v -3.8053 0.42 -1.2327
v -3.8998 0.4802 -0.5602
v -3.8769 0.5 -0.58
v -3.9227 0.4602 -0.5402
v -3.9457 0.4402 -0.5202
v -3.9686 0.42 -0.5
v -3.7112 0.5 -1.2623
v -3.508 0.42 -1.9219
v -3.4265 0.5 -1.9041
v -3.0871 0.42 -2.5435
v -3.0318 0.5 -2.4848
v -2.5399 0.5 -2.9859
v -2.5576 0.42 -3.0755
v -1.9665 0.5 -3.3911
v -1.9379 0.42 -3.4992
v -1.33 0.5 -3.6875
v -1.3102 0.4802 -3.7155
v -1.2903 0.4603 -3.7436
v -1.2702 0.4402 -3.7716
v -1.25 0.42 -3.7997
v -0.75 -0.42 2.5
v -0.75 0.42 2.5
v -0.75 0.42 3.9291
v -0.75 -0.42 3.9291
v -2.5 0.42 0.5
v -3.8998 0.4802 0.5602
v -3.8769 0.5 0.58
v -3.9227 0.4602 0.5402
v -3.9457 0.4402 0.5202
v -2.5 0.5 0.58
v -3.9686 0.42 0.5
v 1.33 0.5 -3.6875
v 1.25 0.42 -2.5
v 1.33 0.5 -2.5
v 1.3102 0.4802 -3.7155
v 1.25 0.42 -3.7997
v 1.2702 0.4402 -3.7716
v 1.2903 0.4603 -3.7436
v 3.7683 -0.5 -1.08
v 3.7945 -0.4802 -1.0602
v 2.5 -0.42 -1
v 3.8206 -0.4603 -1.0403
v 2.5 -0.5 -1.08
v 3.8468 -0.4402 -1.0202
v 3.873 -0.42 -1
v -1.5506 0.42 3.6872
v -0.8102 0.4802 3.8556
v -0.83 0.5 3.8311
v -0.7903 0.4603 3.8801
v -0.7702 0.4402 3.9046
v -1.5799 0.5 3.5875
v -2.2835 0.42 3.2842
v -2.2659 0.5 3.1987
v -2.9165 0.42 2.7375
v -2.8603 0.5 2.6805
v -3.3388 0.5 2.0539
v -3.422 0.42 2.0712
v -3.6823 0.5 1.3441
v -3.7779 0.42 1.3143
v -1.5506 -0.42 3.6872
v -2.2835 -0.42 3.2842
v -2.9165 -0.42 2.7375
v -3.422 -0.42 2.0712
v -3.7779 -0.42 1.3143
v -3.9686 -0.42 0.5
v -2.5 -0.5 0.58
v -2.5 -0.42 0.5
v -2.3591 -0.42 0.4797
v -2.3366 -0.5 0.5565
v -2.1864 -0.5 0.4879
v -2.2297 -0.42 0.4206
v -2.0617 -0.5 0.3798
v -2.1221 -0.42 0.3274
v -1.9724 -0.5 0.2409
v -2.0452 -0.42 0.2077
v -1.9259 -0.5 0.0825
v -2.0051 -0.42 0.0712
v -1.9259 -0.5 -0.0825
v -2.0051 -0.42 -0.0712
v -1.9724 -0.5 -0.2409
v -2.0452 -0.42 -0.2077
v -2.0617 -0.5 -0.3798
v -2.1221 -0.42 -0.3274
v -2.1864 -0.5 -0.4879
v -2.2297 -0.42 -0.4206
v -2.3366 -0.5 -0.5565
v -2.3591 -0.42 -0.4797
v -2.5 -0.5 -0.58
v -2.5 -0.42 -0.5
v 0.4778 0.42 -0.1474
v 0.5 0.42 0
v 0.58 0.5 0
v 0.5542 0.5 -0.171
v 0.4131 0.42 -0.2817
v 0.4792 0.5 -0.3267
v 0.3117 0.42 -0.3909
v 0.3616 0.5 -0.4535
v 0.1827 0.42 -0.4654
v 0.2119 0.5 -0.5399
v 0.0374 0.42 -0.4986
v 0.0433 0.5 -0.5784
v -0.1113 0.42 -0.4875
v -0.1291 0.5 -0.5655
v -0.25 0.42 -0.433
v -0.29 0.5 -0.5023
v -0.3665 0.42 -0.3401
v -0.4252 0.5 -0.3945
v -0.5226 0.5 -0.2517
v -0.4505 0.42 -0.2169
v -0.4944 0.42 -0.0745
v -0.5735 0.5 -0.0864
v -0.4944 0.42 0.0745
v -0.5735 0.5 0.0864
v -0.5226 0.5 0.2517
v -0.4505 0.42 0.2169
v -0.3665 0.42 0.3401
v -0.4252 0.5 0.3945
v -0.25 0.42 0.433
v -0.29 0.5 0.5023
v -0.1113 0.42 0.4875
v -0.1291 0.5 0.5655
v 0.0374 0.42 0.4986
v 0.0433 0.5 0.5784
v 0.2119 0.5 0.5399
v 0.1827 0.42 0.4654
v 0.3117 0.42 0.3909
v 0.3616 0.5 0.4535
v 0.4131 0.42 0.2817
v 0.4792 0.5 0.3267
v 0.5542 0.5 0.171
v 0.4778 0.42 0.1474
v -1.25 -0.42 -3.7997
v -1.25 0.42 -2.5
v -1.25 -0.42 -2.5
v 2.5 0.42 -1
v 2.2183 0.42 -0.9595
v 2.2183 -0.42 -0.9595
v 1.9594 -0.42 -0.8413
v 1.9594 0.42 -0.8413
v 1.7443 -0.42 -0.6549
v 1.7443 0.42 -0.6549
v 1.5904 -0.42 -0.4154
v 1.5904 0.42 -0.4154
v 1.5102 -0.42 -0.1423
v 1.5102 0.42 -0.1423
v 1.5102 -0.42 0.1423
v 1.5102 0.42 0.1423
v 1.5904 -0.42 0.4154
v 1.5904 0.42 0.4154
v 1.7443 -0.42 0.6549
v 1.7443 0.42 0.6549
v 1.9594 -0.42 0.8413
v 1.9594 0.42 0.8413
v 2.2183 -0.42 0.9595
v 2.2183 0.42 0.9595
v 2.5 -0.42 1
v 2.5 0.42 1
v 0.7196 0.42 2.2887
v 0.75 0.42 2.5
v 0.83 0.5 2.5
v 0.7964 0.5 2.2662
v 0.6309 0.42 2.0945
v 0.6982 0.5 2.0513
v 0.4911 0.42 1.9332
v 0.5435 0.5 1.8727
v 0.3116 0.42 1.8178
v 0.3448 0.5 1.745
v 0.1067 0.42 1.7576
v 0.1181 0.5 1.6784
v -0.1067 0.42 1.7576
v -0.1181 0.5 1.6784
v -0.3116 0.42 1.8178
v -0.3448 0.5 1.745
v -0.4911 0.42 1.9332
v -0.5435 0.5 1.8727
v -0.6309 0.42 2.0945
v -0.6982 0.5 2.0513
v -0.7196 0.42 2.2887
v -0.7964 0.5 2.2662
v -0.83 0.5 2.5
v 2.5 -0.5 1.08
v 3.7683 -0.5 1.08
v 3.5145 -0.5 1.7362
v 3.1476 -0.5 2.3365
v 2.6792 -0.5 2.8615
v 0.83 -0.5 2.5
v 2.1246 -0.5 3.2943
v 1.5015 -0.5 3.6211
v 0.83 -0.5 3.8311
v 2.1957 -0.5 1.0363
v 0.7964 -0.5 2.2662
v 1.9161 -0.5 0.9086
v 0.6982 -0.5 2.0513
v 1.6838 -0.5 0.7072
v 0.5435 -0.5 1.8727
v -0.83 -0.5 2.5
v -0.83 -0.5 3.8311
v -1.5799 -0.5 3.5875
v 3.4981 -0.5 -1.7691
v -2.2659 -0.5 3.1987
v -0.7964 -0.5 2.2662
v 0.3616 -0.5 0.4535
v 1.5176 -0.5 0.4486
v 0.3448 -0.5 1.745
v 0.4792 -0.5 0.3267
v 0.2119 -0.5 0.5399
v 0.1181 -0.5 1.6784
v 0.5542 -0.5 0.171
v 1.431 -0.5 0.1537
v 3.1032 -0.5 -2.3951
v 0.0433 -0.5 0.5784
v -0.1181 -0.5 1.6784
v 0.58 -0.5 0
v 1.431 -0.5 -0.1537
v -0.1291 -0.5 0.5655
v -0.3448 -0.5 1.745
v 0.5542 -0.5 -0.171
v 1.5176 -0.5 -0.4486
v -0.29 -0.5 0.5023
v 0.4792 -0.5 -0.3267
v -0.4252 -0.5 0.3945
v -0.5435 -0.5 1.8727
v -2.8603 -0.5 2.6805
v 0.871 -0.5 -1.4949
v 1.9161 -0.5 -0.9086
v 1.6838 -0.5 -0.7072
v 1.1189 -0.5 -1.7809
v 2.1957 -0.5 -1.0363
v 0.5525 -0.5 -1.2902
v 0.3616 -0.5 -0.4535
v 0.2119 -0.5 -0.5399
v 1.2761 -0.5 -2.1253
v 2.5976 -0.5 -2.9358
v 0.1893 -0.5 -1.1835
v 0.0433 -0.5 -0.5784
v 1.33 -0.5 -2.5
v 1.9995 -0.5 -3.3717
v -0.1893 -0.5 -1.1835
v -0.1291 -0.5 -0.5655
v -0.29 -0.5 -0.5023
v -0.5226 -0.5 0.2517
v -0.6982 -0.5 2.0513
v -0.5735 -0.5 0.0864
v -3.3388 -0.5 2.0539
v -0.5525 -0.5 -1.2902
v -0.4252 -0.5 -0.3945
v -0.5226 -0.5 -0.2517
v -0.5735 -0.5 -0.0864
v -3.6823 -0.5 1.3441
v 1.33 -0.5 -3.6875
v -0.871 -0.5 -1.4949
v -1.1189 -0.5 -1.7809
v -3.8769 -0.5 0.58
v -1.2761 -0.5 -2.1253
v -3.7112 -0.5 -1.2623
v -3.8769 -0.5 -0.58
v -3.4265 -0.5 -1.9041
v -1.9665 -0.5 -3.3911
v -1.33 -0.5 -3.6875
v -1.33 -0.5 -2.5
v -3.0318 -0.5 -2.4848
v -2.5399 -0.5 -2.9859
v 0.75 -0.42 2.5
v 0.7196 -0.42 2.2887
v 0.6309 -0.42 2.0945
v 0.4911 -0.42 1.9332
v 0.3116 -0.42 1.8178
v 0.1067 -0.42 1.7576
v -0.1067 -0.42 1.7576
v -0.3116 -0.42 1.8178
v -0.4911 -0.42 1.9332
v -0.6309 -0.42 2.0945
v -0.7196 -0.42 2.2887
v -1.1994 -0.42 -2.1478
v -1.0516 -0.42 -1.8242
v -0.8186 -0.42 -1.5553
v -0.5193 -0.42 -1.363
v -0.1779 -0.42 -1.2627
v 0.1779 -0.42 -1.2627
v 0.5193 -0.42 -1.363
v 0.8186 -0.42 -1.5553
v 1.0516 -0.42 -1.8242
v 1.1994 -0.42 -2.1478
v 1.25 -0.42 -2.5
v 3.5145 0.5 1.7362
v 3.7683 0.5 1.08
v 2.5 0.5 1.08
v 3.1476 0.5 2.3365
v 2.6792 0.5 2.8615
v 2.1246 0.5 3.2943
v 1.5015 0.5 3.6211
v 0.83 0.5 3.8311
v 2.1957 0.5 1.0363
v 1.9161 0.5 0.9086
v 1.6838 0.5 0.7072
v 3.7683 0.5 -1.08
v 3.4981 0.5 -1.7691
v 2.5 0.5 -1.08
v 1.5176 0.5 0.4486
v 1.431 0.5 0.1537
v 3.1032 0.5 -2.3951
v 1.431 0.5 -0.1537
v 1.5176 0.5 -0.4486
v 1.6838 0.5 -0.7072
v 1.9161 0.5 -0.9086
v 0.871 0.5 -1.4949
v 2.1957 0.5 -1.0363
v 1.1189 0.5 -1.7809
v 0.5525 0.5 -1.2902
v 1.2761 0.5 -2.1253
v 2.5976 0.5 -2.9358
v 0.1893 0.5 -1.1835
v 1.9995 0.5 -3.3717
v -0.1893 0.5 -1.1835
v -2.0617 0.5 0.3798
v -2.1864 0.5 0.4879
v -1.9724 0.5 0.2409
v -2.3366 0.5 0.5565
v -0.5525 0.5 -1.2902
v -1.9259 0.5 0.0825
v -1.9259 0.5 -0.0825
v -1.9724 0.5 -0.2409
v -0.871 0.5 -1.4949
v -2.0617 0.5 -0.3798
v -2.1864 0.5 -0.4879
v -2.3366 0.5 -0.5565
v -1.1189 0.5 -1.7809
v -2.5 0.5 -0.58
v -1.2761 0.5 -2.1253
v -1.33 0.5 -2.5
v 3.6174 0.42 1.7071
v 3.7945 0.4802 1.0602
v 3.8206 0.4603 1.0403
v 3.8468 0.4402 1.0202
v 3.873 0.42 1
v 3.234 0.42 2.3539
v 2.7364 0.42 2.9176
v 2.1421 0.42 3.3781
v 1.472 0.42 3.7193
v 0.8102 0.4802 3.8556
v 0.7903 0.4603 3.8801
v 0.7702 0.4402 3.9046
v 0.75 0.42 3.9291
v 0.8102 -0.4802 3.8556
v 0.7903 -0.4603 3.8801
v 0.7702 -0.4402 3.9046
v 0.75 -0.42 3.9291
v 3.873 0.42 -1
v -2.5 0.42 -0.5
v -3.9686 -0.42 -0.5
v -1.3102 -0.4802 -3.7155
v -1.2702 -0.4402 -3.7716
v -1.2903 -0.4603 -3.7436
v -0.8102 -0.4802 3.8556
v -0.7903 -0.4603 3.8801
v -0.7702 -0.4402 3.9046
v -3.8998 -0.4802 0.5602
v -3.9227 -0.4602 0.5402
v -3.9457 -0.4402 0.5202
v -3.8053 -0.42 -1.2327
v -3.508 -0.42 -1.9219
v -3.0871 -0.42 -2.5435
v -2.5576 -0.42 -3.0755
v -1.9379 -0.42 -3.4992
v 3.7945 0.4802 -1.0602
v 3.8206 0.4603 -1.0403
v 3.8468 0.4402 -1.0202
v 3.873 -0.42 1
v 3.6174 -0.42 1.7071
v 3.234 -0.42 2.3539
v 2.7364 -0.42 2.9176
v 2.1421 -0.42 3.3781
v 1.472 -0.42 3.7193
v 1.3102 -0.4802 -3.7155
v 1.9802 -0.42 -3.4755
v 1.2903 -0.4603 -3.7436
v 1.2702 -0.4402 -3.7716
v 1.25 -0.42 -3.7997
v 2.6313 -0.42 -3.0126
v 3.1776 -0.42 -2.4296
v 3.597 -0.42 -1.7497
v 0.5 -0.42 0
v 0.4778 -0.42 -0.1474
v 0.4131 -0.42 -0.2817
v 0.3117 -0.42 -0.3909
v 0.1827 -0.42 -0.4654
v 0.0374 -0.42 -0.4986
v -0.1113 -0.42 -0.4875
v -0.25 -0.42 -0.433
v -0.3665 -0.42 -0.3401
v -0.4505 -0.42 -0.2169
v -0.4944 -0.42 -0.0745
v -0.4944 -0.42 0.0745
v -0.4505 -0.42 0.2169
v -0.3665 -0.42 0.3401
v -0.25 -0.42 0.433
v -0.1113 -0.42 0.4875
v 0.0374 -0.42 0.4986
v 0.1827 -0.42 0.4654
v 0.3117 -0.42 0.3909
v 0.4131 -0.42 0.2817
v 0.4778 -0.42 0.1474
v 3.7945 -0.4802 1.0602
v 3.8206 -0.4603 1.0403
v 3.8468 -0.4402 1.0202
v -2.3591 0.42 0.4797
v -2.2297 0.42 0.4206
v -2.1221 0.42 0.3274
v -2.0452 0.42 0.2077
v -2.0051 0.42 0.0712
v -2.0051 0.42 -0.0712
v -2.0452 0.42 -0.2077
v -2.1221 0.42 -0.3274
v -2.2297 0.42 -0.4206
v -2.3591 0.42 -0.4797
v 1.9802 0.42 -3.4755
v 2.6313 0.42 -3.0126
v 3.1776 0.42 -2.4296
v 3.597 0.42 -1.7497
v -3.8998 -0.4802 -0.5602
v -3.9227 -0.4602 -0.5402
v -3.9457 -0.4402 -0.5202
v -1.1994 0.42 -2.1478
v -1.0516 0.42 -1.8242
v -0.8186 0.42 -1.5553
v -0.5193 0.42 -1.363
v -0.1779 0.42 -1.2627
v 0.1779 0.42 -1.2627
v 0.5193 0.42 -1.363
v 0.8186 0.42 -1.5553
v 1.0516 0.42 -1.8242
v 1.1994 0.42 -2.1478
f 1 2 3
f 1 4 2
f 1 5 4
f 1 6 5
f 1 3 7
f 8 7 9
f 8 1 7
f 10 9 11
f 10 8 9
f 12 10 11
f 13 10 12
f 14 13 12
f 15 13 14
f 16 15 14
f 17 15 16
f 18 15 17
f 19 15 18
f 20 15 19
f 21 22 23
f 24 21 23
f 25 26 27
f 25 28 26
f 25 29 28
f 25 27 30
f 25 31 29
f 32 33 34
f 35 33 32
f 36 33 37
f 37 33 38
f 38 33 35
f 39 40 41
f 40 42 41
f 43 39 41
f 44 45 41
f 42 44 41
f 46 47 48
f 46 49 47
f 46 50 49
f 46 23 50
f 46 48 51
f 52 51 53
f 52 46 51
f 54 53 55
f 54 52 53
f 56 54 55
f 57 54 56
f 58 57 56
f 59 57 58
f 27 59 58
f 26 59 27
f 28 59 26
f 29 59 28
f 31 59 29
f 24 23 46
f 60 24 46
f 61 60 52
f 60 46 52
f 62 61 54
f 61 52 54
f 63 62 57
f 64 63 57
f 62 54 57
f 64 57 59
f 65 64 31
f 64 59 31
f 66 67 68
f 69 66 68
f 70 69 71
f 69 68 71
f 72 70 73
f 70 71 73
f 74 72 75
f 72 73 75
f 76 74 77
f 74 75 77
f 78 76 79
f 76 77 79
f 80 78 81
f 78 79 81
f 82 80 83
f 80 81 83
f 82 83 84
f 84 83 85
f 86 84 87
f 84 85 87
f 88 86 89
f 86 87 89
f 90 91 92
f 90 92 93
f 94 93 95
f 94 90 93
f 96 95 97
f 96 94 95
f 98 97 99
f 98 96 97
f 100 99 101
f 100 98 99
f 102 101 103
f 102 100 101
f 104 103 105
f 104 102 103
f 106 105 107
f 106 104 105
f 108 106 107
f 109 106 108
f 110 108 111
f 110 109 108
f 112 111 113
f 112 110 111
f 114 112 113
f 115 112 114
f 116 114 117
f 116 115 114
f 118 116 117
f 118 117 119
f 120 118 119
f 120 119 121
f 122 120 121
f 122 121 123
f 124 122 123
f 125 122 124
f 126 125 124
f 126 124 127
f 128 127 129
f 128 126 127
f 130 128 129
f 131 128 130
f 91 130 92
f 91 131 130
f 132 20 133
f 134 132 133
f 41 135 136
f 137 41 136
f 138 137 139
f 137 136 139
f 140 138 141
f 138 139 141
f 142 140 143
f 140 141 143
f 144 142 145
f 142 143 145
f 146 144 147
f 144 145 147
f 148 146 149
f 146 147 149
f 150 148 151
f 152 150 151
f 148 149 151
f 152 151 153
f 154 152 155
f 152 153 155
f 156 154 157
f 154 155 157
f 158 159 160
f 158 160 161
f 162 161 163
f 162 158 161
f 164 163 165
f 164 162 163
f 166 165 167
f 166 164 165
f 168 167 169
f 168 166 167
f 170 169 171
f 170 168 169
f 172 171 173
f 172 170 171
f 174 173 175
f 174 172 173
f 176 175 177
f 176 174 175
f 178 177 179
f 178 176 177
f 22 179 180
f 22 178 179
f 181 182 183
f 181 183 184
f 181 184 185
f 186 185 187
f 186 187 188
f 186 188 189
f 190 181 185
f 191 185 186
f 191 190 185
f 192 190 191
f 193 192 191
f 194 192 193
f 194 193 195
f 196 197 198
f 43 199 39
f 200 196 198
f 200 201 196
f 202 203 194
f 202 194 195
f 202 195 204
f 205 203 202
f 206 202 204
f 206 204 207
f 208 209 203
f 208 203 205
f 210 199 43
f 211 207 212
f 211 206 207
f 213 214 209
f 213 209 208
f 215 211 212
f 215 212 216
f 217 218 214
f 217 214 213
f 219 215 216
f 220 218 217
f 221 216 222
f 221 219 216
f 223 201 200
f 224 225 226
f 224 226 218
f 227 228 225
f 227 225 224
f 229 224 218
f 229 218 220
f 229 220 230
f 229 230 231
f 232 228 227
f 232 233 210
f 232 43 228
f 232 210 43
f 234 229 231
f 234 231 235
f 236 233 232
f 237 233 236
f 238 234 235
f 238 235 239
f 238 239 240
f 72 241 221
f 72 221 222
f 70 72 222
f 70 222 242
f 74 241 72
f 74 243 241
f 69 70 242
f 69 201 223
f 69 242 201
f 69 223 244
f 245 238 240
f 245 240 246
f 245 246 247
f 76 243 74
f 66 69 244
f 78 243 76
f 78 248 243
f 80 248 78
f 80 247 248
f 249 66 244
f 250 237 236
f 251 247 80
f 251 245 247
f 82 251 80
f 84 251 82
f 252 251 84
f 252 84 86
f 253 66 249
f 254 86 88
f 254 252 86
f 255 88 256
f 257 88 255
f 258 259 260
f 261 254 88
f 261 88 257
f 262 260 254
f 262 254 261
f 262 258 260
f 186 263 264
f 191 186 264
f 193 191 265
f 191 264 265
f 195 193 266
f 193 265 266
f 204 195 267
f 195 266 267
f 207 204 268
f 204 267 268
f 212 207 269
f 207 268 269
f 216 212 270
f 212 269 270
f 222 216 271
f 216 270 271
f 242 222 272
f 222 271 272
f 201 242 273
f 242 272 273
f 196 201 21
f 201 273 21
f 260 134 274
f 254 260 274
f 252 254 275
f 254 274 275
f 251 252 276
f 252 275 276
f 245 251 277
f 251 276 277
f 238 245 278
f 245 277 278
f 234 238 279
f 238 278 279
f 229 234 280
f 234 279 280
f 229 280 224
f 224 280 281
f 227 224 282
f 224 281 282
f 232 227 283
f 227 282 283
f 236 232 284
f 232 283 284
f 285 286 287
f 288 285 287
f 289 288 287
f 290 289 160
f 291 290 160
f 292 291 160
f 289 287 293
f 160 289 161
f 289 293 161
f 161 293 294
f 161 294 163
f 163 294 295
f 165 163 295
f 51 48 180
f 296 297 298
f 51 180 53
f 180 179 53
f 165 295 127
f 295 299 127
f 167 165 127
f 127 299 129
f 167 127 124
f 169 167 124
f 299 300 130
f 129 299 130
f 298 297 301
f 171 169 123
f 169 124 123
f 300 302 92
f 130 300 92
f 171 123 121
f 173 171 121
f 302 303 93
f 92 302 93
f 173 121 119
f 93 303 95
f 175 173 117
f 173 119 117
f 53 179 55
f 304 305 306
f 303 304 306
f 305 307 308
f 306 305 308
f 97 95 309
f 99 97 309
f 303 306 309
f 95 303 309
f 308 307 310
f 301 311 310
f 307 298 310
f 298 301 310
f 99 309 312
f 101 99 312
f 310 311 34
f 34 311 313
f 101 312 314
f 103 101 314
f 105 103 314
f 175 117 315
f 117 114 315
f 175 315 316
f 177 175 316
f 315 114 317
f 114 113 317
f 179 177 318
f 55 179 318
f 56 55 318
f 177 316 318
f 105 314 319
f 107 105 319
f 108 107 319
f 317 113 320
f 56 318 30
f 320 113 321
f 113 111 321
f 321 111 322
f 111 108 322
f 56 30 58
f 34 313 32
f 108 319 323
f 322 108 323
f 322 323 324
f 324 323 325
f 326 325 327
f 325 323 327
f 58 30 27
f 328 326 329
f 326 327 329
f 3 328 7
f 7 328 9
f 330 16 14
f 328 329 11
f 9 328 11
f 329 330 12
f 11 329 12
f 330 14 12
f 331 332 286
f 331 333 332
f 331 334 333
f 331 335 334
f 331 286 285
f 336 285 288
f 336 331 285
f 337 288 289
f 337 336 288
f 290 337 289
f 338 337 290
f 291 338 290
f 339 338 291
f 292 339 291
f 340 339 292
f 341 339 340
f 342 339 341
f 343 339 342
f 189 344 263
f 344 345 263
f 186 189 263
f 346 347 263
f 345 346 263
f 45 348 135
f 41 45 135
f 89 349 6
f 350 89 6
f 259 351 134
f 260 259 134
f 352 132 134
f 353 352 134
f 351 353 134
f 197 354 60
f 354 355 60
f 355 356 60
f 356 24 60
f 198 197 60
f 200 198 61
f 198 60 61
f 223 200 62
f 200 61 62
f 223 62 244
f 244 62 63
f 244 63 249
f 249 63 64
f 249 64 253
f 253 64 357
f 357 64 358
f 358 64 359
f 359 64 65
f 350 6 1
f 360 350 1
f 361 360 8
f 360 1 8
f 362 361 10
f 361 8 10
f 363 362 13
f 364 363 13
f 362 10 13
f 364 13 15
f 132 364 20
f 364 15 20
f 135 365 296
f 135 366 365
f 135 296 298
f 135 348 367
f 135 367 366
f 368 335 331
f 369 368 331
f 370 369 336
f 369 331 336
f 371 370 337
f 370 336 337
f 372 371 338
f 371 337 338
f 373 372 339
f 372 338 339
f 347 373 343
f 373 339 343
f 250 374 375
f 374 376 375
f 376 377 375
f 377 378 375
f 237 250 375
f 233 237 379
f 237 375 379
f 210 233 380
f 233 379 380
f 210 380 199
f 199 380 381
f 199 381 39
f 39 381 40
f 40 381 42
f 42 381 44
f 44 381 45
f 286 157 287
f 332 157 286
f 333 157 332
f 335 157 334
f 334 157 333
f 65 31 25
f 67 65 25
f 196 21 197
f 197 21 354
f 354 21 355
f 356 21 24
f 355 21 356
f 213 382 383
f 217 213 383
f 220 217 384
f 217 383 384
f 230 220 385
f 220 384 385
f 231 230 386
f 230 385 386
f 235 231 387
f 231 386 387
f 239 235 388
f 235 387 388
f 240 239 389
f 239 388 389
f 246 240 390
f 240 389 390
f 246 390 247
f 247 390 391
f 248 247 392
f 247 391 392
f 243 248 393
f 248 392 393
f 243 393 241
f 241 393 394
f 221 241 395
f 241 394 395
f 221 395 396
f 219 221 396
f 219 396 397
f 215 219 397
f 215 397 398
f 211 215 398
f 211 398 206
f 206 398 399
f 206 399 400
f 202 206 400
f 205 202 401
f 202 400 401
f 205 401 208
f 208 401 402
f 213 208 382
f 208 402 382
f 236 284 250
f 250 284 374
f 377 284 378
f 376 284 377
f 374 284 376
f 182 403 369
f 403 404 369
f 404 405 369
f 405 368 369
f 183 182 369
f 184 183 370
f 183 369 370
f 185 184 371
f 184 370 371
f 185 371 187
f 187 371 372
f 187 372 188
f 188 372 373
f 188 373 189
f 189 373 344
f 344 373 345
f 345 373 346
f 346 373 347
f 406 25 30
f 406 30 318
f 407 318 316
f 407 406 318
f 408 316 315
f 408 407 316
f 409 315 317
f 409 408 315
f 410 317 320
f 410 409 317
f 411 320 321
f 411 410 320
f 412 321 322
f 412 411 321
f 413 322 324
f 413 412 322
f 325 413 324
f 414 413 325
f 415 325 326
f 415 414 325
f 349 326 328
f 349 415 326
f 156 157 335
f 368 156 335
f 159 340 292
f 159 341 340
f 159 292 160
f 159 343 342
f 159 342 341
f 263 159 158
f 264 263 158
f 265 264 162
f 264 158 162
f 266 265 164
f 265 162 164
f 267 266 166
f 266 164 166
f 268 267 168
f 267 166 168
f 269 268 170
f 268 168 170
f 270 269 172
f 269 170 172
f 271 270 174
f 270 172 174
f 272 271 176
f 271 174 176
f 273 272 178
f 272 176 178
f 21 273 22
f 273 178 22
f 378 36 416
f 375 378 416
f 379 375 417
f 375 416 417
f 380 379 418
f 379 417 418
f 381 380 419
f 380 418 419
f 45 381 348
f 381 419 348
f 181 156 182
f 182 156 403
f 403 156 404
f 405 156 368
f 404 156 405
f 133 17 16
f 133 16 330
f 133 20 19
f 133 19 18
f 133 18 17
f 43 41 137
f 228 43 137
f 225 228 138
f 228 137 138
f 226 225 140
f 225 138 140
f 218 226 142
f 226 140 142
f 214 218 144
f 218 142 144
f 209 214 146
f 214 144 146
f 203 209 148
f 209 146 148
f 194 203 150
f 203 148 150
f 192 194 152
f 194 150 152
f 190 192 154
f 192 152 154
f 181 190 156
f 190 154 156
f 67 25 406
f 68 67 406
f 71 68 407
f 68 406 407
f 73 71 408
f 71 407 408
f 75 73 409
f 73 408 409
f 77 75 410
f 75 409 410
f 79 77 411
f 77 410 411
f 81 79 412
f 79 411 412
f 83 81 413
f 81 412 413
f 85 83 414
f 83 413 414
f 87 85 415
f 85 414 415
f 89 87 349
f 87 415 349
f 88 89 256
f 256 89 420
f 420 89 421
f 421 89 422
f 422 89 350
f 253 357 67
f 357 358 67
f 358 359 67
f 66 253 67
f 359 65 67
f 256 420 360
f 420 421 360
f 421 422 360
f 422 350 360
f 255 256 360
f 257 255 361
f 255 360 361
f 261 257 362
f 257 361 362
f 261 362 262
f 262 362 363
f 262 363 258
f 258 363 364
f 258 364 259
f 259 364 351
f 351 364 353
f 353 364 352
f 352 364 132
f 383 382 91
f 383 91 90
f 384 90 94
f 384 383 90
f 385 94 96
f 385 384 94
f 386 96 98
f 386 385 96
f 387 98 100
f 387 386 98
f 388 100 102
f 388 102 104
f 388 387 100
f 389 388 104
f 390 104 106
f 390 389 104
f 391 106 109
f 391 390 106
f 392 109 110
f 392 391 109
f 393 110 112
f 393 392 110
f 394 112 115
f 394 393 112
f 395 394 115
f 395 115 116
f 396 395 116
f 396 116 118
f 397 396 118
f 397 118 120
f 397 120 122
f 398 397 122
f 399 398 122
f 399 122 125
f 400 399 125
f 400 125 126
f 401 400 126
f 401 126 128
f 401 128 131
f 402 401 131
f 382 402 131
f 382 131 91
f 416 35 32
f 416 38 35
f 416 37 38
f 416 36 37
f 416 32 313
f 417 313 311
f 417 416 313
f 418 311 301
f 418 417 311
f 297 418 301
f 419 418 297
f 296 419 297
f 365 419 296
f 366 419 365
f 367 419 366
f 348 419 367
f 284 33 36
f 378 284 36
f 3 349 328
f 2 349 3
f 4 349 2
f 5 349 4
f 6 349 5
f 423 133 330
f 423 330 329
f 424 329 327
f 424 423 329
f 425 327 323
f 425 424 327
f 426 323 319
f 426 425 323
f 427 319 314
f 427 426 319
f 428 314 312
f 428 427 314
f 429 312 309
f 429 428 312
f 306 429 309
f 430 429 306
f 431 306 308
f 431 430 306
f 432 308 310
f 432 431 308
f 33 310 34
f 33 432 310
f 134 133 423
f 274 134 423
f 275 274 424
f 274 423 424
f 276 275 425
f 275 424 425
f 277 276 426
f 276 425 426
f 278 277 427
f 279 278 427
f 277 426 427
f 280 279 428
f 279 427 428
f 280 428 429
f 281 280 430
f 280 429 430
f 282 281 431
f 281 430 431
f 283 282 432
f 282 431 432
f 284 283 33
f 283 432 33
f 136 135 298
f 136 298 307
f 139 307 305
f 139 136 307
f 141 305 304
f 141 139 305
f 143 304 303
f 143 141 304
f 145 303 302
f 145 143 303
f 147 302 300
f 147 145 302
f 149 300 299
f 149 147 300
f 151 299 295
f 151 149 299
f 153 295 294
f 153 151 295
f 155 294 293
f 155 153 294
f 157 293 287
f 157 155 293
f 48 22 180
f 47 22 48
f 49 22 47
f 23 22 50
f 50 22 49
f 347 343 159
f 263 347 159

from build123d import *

# Parameters (mm, degrees)
SKETCH1_R           = 0.5
BOSS_EXTRUDE1_DEPTH = 0.5
CHAMFER1_SIZE       = 0.08
CHAMFER2_SIZE       = 0.08


with BuildPart() as part:
    # Sketch1 → Boss-Extrude1 (new body, symmetric)
    with BuildSketch(Plane(origin=(0, 0, 0), x_dir=(1, 0, 0), z_dir=(0, 1, 0))):
        with BuildLine():
            Line((-2.5, 0.5), (-3.968626967, 0.5))
            ThreePointArc((-3.968626967, 0.5), (-3.087146594, 2.543526274), (-1.25, 3.799671038))
            Line((-1.25, 3.799671038), (-1.25, 2.5))
            ThreePointArc((-1.25, 2.5), (0, 1.25), (1.25, 2.5))
            Line((1.25, 2.5), (1.25, 3.799671038))
            ThreePointArc((1.25, 3.799671038), (2.919037354, 2.734816434), (3.872983346, 1))
            Line((3.872983346, 1), (2.5, 1))
            ThreePointArc((2.5, 1), (1.5, 0), (2.5, -1))
            Line((2.5, -1), (3.872983346, -1))
            ThreePointArc((3.872983346, -1), (2.736391702, -2.917560702), (0.75, -3.929058411))
            Line((0.75, -3.929058411), (0.75, -2.5))
            ThreePointArc((0.75, -2.5), (0, -1.75), (-0.75, -2.5))
            Line((-0.75, -2.5), (-0.75, -3.929058411))
            ThreePointArc((-0.75, -3.929058411), (-2.916499702, -2.73752251), (-3.968626967, -0.5))
            Line((-3.968626967, -0.5), (-2.5, -0.5))
            ThreePointArc((-2.5, -0.5), (-2, 0), (-2.5, 0.5))
        make_face()
        Circle(SKETCH1_R, mode=Mode.SUBTRACT)
    extrude(amount=BOSS_EXTRUDE1_DEPTH, both=True)

    # Chamfer1
    chamfer1_edges = [part.edges().sort_by_distance(p)[0] for p in [
        (-2, 0.5, 0),
        (-3.234313483, 0.5, 0.5),
        (-2.916499702, 0.5, 2.73752251),
        (-0.75, 0.5, 3.214529206),
        (0, 0.5, 1.75),
        (0.75, 0.5, 3.214529206),
        (2.736391702, 0.5, 2.917560702),
        (-0.5, 0.5, 0),
        (3.186491673, 0.5, 1),
        (1.5, 0.5, 0),
        (3.186491673, 0.5, -1),
        (-3.087146594, 0.5, -2.543526274),
        (2.919037354, 0.5, -2.734816434),
        (1.25, 0.5, -3.149835519),
        (0, 0.5, -1.25),
        (-1.25, 0.5, -3.149835519),
        (-3.234313483, 0.5, -0.5),
    ]]
    chamfer(chamfer1_edges, length=CHAMFER1_SIZE)

    # Chamfer2
    chamfer2_edges = [part.edges().sort_by_distance(p)[0] for p in [
        (-1.25, -0.5, -3.149835519),
        (0, -0.5, -1.25),
        (1.25, -0.5, -3.149835519),
        (2.919037354, -0.5, -2.734816434),
        (3.186491673, -0.5, -1),
        (1.5, -0.5, 0),
        (3.186491673, -0.5, 1),
        (2.736391702, -0.5, 2.917560702),
        (0.75, -0.5, 3.214529206),
        (0, -0.5, 1.75),
        (-0.75, -0.5, 3.214529206),
        (-2.916499702, -0.5, 2.73752251),
        (-3.234313483, -0.5, 0.5),
        (-2, -0.5, 0),
        (-3.234313483, -0.5, -0.5),
        (-3.087146594, -0.5, -2.543526274),
        (-0.5, -0.5, 0),
    ]]
    chamfer(chamfer2_edges, length=CHAMFER2_SIZE)


solid = part.part
